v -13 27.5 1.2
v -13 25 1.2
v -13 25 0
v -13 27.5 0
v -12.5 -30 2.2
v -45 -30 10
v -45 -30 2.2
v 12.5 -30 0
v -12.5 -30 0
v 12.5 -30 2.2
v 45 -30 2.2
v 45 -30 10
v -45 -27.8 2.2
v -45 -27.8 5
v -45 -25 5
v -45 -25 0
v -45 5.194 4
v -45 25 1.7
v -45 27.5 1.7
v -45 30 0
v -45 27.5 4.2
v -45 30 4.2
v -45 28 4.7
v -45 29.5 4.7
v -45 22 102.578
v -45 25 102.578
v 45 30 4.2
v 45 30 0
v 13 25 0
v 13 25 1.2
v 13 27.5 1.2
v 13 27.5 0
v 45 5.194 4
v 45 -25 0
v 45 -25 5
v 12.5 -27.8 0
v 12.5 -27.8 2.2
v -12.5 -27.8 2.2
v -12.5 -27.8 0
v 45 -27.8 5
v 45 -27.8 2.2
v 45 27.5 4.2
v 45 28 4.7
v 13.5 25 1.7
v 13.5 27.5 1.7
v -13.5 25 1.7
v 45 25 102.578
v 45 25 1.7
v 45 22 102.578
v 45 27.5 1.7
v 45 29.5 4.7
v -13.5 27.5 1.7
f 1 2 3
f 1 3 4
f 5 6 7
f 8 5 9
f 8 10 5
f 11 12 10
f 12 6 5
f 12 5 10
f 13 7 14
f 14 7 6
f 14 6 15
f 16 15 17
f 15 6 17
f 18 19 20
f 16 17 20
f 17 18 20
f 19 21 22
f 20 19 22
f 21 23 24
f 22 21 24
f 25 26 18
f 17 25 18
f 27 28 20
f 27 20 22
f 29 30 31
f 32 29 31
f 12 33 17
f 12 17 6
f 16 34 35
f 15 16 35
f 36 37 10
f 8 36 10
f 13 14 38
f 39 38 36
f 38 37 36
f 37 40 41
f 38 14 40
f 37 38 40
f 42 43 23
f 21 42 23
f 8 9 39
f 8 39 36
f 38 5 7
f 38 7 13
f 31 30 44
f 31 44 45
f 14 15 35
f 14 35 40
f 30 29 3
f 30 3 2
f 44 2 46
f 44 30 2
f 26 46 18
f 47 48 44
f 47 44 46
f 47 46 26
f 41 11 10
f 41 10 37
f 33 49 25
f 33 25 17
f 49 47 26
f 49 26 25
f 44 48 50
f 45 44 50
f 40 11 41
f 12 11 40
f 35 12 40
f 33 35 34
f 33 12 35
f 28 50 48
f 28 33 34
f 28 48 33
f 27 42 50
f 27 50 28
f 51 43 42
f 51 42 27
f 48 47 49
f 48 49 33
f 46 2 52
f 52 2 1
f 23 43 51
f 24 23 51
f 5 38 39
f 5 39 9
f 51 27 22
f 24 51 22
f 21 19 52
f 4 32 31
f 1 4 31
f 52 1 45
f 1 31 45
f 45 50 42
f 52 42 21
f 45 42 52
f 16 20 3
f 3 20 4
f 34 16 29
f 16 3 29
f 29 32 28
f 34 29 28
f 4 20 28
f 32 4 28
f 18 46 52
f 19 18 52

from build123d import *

# Parameters (mm, degrees)
F0_W      = 90
F0_H      = 60
F1_DEPTH  = 4
F3_DEPTH  = 90
F4_W      = 2.2
F4_H      = 2.2
F4_W_2    = 2.5
F4_H_2    = 2.3
F5_DEPTH  = 90
F4_H_3    = 0.7
F6_DEPTH  = 90
F7_W      = 25
F7_H      = 2.2
F8_DEPTH  = 2.2
F9_W      = 26
F9_H      = 2.5
F10_DEPTH = 1.7
F11_SIZE  = 0.5


with BuildPart() as f1:
    # F0 (on Top) → F1 (new body)
    with BuildSketch(Plane.XY):
        Rectangle(F0_W, F0_H)
    extrude(amount=F1_DEPTH)

    # F2 (on face) → F3 (join, through all)
    with BuildSketch(Plane.YZ.offset(45)):
        Polygon((22, 102.5777145975), (5.1942216862, 4), (25, 4), (25, 102.5777145975), align=None)
        Polygon((-30, 10), (-30, 4), (5.1942216862, 4), align=None)
    extrude(amount=-F3_DEPTH)

    # F4 (on face) → F5 (cut, through all)
    with BuildSketch(Plane.YZ.offset(45)):
        with Locations((-28.9, 1.1)):
            Rectangle(F4_W, F4_H)
        Polygon((-27.8, 2.2), (-27.8, 0), (-25, 0), (-25, 5), (-27.8, 5), align=None)
        with Locations((26.25, 2.85)):
            Rectangle(F4_W_2, F4_H_2)
    extrude(amount=-F5_DEPTH, mode=Mode.SUBTRACT)

    # F4 (on face) → F6 (join, through all)
    with BuildSketch(Plane.YZ.offset(45)):
        with Locations((28.75, 4.35)):
            Rectangle(F4_W_2, F4_H_3)
    extrude(amount=-F6_DEPTH)

    # F7 (on face) → F8 (join, through all)
    with BuildSketch(Plane(origin=(0, 0, 2.2), x_dir=(1, 0, 0), z_dir=(0, 0, -1))):
        with Locations((0, 28.9)):
            Rectangle(F7_W, F7_H)
    extrude(amount=F8_DEPTH)

    # F9 (on face) → F10 (cut, through all)
    with BuildSketch(Plane.XY.offset(1.7)):
        with Locations((0, 26.25)):
            Rectangle(F9_W, F9_H)
    extrude(amount=-F10_DEPTH, mode=Mode.SUBTRACT)

    # F11
    f11_edges = [f1.edges().sort_by_distance(p)[0] for p in [
        (0, 30, 4.7),
        (0, 27.5, 4.7),
        (-13, 26.25, 1.7),
        (13, 26.25, 1.7),
    ]]
    chamfer(f11_edges, length=F11_SIZE)


solid = f1.part
